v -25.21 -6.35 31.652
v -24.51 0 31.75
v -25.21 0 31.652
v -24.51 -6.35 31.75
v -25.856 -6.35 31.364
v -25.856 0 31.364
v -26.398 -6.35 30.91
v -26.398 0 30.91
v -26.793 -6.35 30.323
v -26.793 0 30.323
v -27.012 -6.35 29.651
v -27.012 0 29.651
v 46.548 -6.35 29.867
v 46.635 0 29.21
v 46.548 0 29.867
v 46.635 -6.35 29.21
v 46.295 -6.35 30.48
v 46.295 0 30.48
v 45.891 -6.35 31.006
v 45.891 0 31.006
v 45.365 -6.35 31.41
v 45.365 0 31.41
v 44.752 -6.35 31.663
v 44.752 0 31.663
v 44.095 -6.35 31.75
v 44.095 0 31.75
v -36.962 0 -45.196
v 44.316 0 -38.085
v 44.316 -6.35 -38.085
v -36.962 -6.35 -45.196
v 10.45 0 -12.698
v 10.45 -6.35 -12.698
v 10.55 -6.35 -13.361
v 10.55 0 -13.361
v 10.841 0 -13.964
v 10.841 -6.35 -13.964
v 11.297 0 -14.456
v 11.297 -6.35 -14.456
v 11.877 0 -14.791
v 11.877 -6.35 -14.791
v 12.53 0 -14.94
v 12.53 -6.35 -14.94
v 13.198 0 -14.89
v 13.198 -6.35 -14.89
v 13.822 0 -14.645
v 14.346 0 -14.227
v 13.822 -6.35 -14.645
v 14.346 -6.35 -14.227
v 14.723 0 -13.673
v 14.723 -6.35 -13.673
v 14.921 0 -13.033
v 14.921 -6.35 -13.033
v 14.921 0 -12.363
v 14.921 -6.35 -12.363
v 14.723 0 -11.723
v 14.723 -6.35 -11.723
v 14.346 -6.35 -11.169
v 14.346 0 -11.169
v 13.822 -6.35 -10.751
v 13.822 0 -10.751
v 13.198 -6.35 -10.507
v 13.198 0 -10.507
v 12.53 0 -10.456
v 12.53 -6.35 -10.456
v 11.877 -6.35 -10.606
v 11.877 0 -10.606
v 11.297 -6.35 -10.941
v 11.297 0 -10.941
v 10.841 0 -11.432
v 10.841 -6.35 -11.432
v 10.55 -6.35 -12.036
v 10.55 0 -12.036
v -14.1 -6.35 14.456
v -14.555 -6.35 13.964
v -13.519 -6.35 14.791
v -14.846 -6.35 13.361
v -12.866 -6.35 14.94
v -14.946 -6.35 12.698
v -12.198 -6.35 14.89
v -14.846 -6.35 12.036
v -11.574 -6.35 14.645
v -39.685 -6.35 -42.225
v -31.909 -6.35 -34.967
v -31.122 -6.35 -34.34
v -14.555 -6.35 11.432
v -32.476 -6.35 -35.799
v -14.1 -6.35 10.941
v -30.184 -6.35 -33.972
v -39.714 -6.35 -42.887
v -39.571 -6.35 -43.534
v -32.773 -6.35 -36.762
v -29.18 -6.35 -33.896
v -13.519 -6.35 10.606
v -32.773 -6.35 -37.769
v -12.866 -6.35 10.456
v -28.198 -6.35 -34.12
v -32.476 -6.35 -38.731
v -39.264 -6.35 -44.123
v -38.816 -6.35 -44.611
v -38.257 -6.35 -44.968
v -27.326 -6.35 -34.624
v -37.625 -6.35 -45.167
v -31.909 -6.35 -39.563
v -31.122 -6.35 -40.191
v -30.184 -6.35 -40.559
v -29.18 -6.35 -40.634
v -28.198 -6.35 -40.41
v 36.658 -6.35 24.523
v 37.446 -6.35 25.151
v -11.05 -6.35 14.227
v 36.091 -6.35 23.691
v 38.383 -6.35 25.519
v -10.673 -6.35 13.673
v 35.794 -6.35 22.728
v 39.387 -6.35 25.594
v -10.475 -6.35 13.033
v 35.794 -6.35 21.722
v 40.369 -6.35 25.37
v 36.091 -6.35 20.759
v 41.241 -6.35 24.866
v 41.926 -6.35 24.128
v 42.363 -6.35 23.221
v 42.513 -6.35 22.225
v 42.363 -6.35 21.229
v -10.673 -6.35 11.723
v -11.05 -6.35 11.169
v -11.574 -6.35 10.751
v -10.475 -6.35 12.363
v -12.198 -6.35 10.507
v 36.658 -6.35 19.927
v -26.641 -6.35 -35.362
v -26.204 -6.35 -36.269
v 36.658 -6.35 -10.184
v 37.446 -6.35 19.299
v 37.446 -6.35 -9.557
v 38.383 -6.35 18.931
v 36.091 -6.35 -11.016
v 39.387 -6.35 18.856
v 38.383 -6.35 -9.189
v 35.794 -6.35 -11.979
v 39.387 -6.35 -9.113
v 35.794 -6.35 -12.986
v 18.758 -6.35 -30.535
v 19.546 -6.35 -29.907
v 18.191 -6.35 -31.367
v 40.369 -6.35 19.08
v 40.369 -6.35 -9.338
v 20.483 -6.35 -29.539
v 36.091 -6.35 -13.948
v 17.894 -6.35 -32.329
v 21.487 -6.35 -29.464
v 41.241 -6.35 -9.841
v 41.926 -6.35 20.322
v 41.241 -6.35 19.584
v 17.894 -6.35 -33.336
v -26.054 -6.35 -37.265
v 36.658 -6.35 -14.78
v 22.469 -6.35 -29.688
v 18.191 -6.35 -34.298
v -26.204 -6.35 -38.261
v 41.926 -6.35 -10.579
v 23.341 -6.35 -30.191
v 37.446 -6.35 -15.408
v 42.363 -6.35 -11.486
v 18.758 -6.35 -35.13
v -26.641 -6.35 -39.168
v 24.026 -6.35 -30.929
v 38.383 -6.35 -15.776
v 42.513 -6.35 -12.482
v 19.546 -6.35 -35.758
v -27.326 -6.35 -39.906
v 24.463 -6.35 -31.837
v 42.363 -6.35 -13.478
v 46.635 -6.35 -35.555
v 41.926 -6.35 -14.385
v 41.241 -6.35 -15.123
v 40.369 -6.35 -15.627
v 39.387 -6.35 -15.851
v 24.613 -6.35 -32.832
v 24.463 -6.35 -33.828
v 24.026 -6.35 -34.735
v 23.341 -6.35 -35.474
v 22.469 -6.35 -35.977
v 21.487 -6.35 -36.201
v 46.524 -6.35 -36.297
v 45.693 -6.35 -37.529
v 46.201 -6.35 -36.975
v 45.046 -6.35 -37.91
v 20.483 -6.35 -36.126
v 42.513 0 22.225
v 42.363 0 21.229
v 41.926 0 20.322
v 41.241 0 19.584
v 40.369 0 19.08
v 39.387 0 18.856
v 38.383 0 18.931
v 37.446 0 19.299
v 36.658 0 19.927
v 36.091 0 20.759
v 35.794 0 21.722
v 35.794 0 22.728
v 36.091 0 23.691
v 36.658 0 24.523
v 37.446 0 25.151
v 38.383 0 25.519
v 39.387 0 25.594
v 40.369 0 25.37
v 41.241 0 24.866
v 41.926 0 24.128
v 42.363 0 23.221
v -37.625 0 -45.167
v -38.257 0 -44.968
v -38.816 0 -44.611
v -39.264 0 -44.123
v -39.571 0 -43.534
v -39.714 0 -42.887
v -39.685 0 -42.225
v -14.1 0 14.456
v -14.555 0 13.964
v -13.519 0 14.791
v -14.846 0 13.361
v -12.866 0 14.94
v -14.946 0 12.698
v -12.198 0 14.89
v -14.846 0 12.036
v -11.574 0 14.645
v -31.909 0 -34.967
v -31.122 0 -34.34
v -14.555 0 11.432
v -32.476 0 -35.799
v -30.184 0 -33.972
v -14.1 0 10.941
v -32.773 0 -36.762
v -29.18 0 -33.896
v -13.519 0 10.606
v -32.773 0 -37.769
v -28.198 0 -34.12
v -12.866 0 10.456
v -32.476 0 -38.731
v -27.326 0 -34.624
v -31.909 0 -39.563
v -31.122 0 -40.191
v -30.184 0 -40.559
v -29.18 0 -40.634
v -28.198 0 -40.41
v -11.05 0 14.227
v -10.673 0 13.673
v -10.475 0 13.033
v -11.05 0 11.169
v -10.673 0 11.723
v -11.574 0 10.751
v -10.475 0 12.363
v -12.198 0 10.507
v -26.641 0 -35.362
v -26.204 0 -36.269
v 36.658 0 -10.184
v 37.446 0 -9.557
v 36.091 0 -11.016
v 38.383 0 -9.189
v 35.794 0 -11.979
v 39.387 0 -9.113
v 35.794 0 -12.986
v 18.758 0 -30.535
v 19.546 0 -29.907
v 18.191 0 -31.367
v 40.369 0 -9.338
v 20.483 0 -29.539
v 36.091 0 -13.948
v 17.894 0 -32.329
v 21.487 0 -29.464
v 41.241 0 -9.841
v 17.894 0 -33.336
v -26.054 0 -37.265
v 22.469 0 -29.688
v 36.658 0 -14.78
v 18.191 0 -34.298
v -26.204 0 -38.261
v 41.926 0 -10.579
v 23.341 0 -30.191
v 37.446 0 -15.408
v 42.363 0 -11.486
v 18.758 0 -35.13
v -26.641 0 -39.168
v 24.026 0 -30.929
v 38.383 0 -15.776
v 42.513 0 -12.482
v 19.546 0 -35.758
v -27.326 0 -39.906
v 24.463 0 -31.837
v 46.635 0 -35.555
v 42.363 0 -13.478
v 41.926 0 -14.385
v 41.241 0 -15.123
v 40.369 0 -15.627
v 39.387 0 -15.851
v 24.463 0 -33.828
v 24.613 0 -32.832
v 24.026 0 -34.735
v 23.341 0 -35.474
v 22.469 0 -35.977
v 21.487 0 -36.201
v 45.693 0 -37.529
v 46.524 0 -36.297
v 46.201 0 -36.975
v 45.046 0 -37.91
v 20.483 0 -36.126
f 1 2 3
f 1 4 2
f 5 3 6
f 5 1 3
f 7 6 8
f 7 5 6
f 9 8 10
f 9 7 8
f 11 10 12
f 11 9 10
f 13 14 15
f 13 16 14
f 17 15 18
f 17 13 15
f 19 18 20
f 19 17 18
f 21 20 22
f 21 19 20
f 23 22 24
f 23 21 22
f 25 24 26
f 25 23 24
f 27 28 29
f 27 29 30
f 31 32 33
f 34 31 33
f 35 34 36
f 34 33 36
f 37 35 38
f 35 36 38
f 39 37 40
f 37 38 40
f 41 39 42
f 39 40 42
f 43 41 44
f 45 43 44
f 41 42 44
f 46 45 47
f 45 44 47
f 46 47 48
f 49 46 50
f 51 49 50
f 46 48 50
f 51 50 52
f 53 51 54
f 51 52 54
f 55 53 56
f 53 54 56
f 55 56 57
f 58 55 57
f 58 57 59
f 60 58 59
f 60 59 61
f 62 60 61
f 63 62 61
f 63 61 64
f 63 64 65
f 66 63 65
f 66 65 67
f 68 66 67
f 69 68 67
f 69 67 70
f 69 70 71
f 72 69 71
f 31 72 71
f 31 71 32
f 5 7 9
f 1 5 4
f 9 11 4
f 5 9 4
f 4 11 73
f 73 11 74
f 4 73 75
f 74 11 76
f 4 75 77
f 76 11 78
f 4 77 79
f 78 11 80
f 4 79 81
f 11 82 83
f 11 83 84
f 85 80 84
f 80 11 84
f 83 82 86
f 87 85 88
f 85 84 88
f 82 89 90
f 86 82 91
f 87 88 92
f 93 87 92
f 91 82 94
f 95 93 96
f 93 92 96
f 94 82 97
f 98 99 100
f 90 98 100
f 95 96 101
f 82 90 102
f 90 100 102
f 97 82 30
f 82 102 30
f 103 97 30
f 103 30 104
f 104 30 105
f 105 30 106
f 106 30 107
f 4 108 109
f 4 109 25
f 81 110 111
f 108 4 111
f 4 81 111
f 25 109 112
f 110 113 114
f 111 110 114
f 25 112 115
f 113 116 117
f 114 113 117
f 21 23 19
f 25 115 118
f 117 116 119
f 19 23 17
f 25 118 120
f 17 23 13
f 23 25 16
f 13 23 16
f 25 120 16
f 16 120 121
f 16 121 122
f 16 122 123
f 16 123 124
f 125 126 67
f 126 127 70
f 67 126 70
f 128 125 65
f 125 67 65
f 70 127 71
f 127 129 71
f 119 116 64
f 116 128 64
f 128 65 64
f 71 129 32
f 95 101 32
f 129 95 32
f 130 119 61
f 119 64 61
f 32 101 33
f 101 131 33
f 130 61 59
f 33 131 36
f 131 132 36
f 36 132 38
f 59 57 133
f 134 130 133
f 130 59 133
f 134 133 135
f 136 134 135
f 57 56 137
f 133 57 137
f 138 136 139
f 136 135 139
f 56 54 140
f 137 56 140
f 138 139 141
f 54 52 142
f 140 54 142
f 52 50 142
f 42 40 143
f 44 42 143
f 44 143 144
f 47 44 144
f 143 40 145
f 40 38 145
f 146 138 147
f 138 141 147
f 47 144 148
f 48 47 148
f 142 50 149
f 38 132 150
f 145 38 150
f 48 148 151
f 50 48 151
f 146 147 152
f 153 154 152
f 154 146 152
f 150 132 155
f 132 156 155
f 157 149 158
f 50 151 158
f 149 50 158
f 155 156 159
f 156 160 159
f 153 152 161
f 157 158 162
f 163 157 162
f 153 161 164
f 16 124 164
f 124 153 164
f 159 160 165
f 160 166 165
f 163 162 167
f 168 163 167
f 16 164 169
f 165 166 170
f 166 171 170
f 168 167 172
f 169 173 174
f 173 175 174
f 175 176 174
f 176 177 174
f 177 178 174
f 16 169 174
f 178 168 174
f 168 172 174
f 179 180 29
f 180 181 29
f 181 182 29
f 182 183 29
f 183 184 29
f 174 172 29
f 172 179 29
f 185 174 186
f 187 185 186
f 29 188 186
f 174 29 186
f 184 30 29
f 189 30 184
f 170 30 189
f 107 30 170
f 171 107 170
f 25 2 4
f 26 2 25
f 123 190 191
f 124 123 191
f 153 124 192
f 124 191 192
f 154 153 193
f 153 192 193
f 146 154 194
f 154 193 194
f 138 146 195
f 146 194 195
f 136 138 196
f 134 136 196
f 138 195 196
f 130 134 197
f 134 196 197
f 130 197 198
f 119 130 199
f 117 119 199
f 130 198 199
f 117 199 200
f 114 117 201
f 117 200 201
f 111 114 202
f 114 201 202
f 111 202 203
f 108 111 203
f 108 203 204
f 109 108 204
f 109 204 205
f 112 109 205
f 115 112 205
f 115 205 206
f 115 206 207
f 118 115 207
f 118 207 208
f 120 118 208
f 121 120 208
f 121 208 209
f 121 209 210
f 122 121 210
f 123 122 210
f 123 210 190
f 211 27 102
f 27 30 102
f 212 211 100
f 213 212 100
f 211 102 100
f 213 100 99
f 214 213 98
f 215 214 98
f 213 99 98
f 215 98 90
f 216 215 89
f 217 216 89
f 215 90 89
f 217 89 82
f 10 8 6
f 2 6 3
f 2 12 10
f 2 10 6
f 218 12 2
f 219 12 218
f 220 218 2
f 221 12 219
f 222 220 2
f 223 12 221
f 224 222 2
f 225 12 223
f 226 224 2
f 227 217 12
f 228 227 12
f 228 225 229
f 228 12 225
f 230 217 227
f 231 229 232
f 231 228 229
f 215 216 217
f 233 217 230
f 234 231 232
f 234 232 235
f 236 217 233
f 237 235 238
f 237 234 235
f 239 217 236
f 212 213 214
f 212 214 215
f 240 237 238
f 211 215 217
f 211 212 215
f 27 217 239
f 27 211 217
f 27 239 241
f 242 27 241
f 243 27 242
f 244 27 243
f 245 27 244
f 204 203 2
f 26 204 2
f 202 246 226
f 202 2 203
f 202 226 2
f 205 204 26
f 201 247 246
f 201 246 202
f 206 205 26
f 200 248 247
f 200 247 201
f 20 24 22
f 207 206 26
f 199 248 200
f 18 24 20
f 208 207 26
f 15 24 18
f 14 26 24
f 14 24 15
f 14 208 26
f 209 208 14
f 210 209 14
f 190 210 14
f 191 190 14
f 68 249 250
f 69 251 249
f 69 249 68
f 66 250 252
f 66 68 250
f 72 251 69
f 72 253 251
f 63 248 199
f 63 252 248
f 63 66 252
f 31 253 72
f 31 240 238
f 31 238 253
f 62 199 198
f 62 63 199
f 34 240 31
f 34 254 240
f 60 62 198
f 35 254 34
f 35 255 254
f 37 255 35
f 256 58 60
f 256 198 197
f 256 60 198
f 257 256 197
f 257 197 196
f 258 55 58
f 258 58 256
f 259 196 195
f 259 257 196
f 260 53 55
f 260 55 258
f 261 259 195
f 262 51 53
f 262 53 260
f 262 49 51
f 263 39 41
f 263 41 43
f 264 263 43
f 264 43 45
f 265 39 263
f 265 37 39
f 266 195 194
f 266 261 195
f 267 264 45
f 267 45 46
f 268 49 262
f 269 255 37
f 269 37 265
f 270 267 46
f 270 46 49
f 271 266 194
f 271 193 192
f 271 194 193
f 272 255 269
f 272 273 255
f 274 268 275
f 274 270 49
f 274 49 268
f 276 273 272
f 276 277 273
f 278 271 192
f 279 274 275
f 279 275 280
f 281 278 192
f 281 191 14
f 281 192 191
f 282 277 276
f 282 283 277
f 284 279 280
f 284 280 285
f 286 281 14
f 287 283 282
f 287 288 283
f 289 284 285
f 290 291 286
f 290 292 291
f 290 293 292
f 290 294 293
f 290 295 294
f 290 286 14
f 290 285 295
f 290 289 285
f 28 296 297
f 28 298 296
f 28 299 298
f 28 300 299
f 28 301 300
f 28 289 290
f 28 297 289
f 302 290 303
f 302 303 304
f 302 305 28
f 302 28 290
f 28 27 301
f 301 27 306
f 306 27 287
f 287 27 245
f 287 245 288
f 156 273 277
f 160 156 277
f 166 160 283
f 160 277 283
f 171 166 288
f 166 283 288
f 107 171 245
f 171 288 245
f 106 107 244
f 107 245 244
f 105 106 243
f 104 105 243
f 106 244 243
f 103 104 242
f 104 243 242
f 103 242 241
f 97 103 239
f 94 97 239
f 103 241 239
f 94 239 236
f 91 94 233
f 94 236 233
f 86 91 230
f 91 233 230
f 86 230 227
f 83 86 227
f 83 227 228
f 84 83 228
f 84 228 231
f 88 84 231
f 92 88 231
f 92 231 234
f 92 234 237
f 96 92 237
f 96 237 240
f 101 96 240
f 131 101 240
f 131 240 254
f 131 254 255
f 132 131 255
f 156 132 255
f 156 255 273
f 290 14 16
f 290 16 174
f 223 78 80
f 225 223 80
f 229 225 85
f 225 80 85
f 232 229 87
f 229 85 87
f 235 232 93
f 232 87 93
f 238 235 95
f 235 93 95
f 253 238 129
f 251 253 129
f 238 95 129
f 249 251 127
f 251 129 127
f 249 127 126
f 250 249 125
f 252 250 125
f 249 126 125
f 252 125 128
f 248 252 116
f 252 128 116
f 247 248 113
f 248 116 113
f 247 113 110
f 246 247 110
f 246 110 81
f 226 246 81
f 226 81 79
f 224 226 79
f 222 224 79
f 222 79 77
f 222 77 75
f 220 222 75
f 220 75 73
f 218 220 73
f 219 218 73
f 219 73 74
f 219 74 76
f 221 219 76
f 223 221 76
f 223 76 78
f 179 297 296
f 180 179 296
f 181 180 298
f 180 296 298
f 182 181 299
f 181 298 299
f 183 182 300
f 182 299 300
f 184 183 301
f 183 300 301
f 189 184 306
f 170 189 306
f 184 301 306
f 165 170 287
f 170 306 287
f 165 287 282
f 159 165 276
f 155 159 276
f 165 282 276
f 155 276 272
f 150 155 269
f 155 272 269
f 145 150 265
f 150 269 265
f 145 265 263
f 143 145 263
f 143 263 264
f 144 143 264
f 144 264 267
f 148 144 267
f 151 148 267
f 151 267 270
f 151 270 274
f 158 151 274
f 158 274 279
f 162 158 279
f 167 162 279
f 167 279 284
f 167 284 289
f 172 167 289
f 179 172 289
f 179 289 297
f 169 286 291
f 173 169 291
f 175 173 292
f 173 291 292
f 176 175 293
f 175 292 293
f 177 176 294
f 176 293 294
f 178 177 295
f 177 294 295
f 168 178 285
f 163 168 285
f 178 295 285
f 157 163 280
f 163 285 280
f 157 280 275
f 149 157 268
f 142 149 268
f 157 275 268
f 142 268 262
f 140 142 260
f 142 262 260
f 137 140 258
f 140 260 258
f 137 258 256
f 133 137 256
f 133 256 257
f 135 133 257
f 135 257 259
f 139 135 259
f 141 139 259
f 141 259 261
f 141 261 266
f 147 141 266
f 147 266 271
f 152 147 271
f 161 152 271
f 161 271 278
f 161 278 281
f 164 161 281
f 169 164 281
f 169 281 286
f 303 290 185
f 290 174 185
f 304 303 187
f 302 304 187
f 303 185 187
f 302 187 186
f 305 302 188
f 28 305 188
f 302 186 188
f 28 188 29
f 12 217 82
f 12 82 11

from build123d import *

# Parameters (mm, degrees)
BOSS_EXTRUDE1_DEPTH     = 6.35
F_1_4_CLEARANCE_HOLE1_D = 6.7564
F_8_CLEARANCE_HOLE1_D   = 4.4958
FILLET1_R               = 2.54


with BuildPart() as part:
    # Sketch1 → Boss-Extrude1 (new body)
    with BuildSketch(Plane(origin=(0, 0, 0), x_dir=(1, 0, 0), z_dir=(0, 1, 0))):
        Polygon((46.634796, -31.75), (46.634796, 22.824939239), (46.634796, 37.882236802), (-40.259946838, 45.48454172), (-26.64141329, -31.75), align=None)
    extrude(amount=-BOSS_EXTRUDE1_DEPTH)

    # 1/4 Clearance Hole1 (through all)
    with Locations(Plane(origin=(0, -6.35, 0), x_dir=(-1, 0, 0), z_dir=(0, -1, 0))):
        with Locations((-21.234796, 32.832322476), (-39.1347856, -22.225), (-39.1347856, 12.482236802), (29.432583699, 37.26514381)):
            Hole(F_1_4_CLEARANCE_HOLE1_D / 2)

    # #8 Clearance Hole1 (through all)
    with Locations(Plane(origin=(0, 0, 0), x_dir=(1, 0, 0), z_dir=(0, 1, 0))):
        with Locations((12.698082155, 12.698082155), (-12.698082155, -12.698082155)):
            Hole(F_8_CLEARANCE_HOLE1_D / 2)

    # Fillet1
    fillet1_edges = [part.edges().sort_by_distance(p)[0] for p in [
        (46.634796, -3.175, 31.75),
        (-26.64141329, -3.175, 31.75),
        (-40.259946838, -3.175, -45.48454172),
        (46.634796, -3.175, -37.882236802),
    ]]
    fillet(fillet1_edges, radius=FILLET1_R)


solid = part.part
